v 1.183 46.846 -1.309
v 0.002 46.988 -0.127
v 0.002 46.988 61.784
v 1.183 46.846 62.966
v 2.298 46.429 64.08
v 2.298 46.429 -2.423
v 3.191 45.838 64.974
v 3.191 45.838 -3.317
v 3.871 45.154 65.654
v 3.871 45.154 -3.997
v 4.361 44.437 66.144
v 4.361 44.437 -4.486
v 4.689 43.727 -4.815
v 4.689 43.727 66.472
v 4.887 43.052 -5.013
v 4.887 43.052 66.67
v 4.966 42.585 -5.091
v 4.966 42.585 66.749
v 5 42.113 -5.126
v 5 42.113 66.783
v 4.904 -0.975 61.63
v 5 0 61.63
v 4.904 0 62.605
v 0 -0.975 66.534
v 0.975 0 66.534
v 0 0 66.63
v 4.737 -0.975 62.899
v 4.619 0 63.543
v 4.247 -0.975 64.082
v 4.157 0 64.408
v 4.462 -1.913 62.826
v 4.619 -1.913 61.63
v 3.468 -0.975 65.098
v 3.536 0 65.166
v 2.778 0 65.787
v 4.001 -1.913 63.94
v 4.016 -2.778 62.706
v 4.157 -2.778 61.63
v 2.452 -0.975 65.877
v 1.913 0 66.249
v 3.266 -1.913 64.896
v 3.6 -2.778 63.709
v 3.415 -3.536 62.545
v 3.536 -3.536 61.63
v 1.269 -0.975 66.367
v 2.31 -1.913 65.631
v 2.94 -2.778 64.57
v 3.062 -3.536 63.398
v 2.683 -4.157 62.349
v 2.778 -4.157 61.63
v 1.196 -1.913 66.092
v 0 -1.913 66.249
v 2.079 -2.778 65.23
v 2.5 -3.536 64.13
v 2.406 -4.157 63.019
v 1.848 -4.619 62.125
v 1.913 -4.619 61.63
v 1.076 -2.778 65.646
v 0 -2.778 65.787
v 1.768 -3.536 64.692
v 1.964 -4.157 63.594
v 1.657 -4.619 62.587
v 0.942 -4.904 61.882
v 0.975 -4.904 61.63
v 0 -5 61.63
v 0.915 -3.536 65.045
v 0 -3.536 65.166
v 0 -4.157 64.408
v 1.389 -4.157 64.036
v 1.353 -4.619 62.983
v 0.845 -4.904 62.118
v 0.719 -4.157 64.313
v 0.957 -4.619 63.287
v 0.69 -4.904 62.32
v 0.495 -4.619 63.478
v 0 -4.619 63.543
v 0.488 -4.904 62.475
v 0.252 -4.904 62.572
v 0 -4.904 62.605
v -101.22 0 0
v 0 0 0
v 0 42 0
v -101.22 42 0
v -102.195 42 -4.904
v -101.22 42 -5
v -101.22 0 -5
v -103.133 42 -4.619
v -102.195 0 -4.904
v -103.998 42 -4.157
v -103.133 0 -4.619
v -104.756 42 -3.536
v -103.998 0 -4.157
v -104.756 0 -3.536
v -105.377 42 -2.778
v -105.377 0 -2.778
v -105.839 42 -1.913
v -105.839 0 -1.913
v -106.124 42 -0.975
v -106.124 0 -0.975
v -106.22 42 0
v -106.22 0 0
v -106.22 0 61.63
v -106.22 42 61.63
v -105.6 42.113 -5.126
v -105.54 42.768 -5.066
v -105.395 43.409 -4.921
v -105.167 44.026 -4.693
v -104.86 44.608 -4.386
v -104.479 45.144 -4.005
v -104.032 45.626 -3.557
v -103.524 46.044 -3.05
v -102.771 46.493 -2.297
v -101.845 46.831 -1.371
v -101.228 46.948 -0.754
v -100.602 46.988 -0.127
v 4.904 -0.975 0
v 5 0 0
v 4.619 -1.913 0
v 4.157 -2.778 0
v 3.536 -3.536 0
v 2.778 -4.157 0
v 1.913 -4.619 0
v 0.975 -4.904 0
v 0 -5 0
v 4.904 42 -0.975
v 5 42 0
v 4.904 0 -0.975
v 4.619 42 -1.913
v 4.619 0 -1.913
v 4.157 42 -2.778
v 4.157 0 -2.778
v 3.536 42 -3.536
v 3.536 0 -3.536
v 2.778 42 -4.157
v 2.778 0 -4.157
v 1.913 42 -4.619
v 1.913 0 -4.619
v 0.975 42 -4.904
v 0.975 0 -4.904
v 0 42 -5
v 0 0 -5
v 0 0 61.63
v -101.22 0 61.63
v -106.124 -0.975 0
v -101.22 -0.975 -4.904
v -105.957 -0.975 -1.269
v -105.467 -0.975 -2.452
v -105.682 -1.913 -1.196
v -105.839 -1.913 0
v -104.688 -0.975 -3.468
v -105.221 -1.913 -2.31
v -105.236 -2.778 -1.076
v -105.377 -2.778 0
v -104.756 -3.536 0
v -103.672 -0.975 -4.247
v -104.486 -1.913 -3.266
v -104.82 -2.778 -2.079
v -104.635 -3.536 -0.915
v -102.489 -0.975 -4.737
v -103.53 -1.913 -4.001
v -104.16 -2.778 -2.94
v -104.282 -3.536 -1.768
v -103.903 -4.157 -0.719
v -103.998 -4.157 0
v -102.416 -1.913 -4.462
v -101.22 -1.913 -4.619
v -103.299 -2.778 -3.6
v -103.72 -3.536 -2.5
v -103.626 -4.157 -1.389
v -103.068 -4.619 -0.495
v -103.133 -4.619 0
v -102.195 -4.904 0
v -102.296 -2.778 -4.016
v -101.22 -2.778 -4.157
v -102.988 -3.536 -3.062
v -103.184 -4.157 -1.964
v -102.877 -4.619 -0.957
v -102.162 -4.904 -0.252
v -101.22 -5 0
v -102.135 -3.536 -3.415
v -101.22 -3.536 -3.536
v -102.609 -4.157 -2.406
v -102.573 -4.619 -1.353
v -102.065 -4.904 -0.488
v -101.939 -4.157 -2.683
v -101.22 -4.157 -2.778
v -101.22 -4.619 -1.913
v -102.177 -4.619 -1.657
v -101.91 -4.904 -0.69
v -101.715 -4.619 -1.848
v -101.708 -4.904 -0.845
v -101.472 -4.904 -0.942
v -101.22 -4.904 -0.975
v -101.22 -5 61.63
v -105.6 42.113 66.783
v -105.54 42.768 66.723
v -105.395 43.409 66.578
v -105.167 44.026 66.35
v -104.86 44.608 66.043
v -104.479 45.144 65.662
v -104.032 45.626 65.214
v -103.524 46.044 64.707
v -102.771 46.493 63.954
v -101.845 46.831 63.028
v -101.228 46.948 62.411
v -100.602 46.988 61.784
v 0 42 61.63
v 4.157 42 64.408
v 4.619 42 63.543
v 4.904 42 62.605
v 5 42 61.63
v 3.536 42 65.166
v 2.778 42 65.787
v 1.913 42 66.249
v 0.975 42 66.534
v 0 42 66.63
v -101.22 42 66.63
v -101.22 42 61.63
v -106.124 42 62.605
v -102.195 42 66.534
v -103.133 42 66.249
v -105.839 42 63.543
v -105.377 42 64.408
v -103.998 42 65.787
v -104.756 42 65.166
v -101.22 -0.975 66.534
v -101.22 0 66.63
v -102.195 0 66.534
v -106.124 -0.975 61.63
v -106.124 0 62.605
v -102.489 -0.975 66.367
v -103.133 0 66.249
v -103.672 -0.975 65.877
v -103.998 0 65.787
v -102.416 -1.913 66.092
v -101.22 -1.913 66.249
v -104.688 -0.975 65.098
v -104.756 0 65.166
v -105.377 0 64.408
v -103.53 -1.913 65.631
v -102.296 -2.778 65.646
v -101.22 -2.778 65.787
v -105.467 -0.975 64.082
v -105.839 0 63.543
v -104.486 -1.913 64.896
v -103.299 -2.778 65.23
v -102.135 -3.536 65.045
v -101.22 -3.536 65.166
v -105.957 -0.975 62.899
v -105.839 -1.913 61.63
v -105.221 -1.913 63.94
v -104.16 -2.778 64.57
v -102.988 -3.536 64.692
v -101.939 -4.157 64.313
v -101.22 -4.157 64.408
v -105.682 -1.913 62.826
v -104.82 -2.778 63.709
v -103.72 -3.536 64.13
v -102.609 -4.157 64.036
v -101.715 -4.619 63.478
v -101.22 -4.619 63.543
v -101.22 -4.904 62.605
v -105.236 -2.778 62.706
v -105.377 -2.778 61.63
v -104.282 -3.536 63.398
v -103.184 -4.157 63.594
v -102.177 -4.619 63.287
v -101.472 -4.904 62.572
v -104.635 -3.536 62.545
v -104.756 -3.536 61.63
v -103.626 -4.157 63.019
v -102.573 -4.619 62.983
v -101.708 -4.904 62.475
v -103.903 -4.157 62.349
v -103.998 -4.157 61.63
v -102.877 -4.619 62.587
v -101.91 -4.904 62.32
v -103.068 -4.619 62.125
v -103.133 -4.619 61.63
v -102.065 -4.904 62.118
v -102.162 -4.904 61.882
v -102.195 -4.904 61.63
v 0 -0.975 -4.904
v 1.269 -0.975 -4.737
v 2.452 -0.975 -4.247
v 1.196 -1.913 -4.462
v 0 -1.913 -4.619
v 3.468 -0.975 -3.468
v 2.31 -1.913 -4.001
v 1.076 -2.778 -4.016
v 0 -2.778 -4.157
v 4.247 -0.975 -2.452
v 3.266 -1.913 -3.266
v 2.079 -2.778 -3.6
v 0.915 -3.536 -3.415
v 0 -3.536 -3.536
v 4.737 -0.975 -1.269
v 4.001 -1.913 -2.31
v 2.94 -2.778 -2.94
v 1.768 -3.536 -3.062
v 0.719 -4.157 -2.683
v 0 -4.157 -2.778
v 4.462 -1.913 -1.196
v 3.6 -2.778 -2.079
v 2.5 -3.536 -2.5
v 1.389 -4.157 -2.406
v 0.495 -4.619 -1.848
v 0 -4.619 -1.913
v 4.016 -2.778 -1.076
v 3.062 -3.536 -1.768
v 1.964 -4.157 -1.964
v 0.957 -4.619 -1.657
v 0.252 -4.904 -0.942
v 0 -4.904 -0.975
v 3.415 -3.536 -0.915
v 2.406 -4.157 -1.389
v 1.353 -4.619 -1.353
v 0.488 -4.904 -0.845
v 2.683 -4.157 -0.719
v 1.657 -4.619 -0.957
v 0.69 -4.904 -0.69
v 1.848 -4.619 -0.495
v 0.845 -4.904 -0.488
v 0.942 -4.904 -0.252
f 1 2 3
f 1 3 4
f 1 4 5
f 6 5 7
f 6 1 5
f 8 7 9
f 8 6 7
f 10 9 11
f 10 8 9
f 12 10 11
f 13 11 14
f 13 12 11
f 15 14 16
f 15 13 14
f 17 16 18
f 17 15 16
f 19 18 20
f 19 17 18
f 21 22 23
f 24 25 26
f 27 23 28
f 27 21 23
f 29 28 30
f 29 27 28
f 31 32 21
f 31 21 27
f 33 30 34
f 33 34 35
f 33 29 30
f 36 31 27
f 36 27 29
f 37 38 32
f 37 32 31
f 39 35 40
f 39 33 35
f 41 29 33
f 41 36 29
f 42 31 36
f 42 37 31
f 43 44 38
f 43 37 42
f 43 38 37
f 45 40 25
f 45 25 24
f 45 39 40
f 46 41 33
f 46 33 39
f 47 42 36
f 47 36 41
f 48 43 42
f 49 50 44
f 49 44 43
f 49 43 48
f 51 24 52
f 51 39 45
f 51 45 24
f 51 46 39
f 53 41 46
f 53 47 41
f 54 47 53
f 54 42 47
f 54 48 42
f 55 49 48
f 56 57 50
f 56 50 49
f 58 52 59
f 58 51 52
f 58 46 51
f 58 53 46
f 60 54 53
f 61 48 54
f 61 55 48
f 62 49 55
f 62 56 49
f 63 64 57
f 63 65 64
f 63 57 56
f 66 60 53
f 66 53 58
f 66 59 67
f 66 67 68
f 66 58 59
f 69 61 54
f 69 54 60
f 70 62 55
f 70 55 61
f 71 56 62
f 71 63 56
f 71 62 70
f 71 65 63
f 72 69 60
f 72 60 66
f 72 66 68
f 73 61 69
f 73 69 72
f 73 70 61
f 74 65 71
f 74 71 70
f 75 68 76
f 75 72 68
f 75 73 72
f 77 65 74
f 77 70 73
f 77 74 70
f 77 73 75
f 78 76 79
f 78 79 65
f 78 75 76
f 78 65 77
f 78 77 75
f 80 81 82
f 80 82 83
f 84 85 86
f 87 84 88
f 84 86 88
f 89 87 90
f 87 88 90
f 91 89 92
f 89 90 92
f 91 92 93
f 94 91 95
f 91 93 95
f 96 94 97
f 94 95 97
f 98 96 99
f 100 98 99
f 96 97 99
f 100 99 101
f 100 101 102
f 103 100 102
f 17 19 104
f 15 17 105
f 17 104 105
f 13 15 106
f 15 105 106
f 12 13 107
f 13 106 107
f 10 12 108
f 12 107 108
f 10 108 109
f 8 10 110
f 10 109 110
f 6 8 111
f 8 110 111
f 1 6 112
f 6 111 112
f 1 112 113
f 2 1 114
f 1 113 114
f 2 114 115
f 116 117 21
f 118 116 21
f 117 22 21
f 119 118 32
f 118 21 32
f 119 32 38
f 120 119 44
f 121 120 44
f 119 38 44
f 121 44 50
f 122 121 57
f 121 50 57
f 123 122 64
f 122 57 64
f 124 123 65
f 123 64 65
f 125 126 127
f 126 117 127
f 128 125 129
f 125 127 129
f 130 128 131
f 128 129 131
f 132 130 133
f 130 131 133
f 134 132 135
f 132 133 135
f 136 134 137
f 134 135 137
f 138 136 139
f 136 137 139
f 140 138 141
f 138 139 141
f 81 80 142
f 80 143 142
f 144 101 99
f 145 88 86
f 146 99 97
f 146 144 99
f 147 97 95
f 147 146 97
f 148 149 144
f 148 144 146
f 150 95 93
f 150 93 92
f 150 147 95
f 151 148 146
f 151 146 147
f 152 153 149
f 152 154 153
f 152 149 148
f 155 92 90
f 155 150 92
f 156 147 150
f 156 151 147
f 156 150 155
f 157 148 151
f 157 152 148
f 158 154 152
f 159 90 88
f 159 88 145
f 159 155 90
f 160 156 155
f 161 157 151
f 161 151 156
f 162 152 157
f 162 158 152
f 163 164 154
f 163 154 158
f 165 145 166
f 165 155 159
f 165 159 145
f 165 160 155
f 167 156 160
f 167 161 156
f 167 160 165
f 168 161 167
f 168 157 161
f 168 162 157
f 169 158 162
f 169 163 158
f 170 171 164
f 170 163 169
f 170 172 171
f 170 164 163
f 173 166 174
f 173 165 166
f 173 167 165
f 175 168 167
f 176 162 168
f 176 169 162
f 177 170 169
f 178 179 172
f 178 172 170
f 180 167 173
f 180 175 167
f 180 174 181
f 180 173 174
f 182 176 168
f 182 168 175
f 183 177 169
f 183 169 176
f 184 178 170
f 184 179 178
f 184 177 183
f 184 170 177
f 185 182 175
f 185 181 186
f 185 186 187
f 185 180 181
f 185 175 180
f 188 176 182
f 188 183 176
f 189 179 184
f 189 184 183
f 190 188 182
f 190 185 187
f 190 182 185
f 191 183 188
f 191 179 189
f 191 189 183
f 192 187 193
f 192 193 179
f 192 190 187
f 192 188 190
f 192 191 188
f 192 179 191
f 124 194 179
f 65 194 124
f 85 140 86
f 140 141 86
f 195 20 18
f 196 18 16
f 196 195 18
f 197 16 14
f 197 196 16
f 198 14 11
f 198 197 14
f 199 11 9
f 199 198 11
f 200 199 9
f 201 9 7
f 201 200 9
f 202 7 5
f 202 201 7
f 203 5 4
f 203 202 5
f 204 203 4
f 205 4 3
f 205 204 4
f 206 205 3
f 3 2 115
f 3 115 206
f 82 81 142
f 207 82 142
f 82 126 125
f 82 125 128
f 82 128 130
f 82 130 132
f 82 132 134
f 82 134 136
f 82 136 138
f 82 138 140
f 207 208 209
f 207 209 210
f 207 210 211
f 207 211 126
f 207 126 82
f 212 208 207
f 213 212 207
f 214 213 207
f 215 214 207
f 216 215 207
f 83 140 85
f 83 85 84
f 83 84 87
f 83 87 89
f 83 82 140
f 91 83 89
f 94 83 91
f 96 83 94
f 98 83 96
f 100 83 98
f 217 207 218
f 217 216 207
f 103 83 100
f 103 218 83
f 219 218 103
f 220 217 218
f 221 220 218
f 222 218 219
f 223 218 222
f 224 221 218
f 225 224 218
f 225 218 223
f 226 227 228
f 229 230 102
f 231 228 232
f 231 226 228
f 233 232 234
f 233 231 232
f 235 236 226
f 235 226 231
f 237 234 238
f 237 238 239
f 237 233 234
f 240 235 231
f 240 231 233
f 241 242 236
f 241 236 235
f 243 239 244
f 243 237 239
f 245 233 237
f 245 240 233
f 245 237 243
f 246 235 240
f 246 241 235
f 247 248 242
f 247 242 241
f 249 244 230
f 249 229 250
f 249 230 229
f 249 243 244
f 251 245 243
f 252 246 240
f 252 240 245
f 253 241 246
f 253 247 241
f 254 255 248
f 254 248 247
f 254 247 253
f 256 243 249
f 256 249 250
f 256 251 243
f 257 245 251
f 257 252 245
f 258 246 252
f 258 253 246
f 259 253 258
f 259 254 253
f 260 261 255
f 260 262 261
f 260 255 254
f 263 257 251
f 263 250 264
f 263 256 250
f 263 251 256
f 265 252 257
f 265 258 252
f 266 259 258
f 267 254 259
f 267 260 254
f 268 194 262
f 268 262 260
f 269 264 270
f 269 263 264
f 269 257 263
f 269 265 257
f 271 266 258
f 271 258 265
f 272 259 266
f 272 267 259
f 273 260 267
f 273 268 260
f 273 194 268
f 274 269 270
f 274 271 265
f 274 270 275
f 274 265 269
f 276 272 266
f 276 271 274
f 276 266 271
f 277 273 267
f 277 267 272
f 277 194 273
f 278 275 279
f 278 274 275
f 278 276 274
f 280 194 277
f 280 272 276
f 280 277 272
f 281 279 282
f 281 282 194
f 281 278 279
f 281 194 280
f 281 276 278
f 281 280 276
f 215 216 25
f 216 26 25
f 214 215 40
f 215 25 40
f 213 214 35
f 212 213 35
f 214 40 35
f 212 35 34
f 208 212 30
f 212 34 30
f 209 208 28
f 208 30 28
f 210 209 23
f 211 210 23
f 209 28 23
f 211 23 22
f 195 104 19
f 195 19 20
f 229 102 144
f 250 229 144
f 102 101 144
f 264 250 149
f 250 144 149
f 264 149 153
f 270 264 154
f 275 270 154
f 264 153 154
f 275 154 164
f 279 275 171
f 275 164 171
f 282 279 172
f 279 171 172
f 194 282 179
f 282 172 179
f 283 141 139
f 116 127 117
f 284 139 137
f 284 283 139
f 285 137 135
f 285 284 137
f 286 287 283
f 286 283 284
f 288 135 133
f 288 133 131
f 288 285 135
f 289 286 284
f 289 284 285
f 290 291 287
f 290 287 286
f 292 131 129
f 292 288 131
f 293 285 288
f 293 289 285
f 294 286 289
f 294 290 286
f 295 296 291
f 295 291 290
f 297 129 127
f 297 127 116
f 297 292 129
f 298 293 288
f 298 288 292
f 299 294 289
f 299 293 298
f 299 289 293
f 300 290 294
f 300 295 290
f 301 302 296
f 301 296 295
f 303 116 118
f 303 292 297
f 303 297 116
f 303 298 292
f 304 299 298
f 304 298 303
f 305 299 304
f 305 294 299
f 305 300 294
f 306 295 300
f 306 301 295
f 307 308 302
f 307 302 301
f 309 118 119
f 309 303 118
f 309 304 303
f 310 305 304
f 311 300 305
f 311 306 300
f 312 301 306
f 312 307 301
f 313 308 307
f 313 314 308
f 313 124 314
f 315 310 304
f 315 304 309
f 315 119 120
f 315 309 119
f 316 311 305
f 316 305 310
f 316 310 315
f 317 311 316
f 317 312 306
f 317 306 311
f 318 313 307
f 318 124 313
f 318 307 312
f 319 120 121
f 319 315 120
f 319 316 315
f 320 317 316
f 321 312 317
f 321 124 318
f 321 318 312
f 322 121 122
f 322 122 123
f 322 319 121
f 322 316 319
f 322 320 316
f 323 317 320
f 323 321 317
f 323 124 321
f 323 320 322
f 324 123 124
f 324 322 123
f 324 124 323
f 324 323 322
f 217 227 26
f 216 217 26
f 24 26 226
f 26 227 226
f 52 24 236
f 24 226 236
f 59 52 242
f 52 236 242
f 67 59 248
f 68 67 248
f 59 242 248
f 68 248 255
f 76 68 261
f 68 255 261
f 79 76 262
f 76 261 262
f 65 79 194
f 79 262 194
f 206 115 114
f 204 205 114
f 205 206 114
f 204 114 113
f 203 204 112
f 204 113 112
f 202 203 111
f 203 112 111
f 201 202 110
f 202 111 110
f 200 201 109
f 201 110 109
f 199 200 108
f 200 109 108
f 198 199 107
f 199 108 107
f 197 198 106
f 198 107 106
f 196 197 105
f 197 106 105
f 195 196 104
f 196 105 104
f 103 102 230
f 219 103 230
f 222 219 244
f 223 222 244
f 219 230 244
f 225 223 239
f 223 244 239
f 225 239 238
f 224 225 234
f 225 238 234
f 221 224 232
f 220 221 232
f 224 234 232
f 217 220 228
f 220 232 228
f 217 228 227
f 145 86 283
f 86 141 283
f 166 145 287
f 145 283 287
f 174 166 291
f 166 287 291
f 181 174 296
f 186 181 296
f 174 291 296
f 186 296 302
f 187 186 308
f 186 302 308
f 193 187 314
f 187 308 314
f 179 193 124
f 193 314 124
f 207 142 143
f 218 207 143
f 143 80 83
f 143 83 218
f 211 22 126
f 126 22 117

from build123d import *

# Parameters (mm, degrees)
F0_W        = 101.22
F0_H        = 61.63
F1_DEPTH    = 5
F2_R        = 4.99999
F3_W        = 101.22
F3_H        = 61.63
F5_DEPTH    = 42
F6_W        = 4.8751346767
F6_H        = 71.9082504511
F7_DEPTH    = 110.6
F8_T1_DEPTH = 96.9004535608
F8_T3_DEPTH = 135.5922031097


# Not quite as in the source:
# - a fillet or chamfer that OpenCascade refuses, or shapes differently, is made with other operations: its cross-section is extruded or revolved along the edge and cut away or added
# - a fillet or chamfer is up to 0.001 mm smaller than in the source, because OpenCascade refuses the exact size


with BuildPart() as f1:
    # F0 (on Front) → F1 (new body)
    with BuildSketch(Plane.XZ):
        with BuildLine():
            Line((0, 66.63), (-101.22, 66.63))
            ThreePointArc((-101.22, 66.63), (-104.7555339059, 65.1655339059), (-106.22, 61.63))
            Line((-106.22, 61.63), (-106.22, 0))
            ThreePointArc((-106.22, 0), (-104.7555339059, -3.5355339059), (-101.22, -5))
            Line((-101.22, -5), (0, -5))
            ThreePointArc((0, -5), (3.5355339059, -3.5355339059), (5, 0))
            Line((5, 0), (5, 61.63))
            ThreePointArc((5, 61.63), (3.5355339059, 65.1655339059), (0, 66.63))
        make_face()
        with Locations((-50.61, 30.815)):
            Rectangle(F0_W, F0_H, mode=Mode.SUBTRACT)
        with Locations((-50.61, 30.815)):
            Rectangle(F0_W, F0_H)
    extrude(amount=F1_DEPTH)

    # F2 (radius 5 in the source; OpenCascade refuses exactly that, so slightly less here)
    f2_edges = [f1.edges().sort_by_distance(p)[0] for p in [
        (-50.61, -5, -5),
    ]]
    fillet(f2_edges, radius=F2_R)

    # F3 (on face) → F5 (join)
    with BuildSketch(Plane(origin=(0, 0, 0), x_dir=(-1, 0, 0), z_dir=(0, 1, 0))):
        with BuildLine():
            Line((101.22, 66.63), (0, 66.63))
            ThreePointArc((0, 66.63), (-3.5355339059, 65.1655339059), (-5, 61.63))
            Line((-5, 61.63), (-5, 0))
            ThreePointArc((-5, 0), (-3.5355339059, -3.5355339059), (0, -5))
            Line((0, -5), (101.22, -5))
            ThreePointArc((101.22, -5), (104.7555339059, -3.5355339059), (106.22, 0))
            Line((106.22, 0), (106.22, 61.63))
            ThreePointArc((106.22, 61.63), (104.7555339059, 65.1655339059), (101.22, 66.63))
        make_face()
        with Locations((50.61, 30.815)):
            Rectangle(F3_W, F3_H, mode=Mode.SUBTRACT)
    extrude(amount=F5_DEPTH)


with BuildPart() as f7:
    # F6 (on face) → F7 (new body)
    with BuildSketch(Plane.YZ.offset(5)):
        with Locations((44.5501934737, 30.8286100626)):
            Rectangle(F6_W, F6_H)
    extrude(amount=-F7_DEPTH)

    # F8: fillet of radius 5 on 4 edges, made by hand

    # F8_s2 → F8_t1 (cut)
    with BuildSketch(Plane.XY.offset(-17.6216167178)):
        with BuildLine():
            ThreePointArc((0.0015593781, 46.987760812), (3.4926676107, 45.5671690464), (5, 42.1126261353))
            Line((5, 42.1126261353), (5, 46.987760812))
            Line((5, 46.987760812), (0.0015593781, 46.987760812))
        make_face()
        with BuildLine():
            ThreePointArc((-100.6015593781, 46.987760812), (-104.0926676107, 45.5671690464), (-105.6, 42.1126261353))
            Line((-105.6, 42.1126261353), (-105.6, 46.987760812))
            Line((-105.6, 46.987760812), (-100.6015593781, 46.987760812))
        make_face()
    extrude(amount=F8_T1_DEPTH, mode=Mode.SUBTRACT)

    # F8_s4 → F8_t3 (cut)
    with BuildSketch(Plane.YZ.offset(-118.0961015548)):
        with BuildLine():
            ThreePointArc((42.1126261353, 66.7827352881), (45.5671690464, 65.2754028988), (46.987760812, 61.7842946662))
            Line((46.987760812, 61.7842946662), (46.987760812, 66.7827352881))
            Line((46.987760812, 66.7827352881), (42.1126261353, 66.7827352881))
        make_face()
        with BuildLine():
            ThreePointArc((42.1126261353, -5.1255151629), (45.5671690464, -3.6181827736), (46.987760812, -0.127074541))
            Line((46.987760812, -0.127074541), (46.987760812, -5.1255151629))
            Line((46.987760812, -5.1255151629), (42.1126261353, -5.1255151629))
        make_face()
    extrude(amount=F8_T3_DEPTH, mode=Mode.SUBTRACT)


solid = Compound([f1.part, f7.part])
